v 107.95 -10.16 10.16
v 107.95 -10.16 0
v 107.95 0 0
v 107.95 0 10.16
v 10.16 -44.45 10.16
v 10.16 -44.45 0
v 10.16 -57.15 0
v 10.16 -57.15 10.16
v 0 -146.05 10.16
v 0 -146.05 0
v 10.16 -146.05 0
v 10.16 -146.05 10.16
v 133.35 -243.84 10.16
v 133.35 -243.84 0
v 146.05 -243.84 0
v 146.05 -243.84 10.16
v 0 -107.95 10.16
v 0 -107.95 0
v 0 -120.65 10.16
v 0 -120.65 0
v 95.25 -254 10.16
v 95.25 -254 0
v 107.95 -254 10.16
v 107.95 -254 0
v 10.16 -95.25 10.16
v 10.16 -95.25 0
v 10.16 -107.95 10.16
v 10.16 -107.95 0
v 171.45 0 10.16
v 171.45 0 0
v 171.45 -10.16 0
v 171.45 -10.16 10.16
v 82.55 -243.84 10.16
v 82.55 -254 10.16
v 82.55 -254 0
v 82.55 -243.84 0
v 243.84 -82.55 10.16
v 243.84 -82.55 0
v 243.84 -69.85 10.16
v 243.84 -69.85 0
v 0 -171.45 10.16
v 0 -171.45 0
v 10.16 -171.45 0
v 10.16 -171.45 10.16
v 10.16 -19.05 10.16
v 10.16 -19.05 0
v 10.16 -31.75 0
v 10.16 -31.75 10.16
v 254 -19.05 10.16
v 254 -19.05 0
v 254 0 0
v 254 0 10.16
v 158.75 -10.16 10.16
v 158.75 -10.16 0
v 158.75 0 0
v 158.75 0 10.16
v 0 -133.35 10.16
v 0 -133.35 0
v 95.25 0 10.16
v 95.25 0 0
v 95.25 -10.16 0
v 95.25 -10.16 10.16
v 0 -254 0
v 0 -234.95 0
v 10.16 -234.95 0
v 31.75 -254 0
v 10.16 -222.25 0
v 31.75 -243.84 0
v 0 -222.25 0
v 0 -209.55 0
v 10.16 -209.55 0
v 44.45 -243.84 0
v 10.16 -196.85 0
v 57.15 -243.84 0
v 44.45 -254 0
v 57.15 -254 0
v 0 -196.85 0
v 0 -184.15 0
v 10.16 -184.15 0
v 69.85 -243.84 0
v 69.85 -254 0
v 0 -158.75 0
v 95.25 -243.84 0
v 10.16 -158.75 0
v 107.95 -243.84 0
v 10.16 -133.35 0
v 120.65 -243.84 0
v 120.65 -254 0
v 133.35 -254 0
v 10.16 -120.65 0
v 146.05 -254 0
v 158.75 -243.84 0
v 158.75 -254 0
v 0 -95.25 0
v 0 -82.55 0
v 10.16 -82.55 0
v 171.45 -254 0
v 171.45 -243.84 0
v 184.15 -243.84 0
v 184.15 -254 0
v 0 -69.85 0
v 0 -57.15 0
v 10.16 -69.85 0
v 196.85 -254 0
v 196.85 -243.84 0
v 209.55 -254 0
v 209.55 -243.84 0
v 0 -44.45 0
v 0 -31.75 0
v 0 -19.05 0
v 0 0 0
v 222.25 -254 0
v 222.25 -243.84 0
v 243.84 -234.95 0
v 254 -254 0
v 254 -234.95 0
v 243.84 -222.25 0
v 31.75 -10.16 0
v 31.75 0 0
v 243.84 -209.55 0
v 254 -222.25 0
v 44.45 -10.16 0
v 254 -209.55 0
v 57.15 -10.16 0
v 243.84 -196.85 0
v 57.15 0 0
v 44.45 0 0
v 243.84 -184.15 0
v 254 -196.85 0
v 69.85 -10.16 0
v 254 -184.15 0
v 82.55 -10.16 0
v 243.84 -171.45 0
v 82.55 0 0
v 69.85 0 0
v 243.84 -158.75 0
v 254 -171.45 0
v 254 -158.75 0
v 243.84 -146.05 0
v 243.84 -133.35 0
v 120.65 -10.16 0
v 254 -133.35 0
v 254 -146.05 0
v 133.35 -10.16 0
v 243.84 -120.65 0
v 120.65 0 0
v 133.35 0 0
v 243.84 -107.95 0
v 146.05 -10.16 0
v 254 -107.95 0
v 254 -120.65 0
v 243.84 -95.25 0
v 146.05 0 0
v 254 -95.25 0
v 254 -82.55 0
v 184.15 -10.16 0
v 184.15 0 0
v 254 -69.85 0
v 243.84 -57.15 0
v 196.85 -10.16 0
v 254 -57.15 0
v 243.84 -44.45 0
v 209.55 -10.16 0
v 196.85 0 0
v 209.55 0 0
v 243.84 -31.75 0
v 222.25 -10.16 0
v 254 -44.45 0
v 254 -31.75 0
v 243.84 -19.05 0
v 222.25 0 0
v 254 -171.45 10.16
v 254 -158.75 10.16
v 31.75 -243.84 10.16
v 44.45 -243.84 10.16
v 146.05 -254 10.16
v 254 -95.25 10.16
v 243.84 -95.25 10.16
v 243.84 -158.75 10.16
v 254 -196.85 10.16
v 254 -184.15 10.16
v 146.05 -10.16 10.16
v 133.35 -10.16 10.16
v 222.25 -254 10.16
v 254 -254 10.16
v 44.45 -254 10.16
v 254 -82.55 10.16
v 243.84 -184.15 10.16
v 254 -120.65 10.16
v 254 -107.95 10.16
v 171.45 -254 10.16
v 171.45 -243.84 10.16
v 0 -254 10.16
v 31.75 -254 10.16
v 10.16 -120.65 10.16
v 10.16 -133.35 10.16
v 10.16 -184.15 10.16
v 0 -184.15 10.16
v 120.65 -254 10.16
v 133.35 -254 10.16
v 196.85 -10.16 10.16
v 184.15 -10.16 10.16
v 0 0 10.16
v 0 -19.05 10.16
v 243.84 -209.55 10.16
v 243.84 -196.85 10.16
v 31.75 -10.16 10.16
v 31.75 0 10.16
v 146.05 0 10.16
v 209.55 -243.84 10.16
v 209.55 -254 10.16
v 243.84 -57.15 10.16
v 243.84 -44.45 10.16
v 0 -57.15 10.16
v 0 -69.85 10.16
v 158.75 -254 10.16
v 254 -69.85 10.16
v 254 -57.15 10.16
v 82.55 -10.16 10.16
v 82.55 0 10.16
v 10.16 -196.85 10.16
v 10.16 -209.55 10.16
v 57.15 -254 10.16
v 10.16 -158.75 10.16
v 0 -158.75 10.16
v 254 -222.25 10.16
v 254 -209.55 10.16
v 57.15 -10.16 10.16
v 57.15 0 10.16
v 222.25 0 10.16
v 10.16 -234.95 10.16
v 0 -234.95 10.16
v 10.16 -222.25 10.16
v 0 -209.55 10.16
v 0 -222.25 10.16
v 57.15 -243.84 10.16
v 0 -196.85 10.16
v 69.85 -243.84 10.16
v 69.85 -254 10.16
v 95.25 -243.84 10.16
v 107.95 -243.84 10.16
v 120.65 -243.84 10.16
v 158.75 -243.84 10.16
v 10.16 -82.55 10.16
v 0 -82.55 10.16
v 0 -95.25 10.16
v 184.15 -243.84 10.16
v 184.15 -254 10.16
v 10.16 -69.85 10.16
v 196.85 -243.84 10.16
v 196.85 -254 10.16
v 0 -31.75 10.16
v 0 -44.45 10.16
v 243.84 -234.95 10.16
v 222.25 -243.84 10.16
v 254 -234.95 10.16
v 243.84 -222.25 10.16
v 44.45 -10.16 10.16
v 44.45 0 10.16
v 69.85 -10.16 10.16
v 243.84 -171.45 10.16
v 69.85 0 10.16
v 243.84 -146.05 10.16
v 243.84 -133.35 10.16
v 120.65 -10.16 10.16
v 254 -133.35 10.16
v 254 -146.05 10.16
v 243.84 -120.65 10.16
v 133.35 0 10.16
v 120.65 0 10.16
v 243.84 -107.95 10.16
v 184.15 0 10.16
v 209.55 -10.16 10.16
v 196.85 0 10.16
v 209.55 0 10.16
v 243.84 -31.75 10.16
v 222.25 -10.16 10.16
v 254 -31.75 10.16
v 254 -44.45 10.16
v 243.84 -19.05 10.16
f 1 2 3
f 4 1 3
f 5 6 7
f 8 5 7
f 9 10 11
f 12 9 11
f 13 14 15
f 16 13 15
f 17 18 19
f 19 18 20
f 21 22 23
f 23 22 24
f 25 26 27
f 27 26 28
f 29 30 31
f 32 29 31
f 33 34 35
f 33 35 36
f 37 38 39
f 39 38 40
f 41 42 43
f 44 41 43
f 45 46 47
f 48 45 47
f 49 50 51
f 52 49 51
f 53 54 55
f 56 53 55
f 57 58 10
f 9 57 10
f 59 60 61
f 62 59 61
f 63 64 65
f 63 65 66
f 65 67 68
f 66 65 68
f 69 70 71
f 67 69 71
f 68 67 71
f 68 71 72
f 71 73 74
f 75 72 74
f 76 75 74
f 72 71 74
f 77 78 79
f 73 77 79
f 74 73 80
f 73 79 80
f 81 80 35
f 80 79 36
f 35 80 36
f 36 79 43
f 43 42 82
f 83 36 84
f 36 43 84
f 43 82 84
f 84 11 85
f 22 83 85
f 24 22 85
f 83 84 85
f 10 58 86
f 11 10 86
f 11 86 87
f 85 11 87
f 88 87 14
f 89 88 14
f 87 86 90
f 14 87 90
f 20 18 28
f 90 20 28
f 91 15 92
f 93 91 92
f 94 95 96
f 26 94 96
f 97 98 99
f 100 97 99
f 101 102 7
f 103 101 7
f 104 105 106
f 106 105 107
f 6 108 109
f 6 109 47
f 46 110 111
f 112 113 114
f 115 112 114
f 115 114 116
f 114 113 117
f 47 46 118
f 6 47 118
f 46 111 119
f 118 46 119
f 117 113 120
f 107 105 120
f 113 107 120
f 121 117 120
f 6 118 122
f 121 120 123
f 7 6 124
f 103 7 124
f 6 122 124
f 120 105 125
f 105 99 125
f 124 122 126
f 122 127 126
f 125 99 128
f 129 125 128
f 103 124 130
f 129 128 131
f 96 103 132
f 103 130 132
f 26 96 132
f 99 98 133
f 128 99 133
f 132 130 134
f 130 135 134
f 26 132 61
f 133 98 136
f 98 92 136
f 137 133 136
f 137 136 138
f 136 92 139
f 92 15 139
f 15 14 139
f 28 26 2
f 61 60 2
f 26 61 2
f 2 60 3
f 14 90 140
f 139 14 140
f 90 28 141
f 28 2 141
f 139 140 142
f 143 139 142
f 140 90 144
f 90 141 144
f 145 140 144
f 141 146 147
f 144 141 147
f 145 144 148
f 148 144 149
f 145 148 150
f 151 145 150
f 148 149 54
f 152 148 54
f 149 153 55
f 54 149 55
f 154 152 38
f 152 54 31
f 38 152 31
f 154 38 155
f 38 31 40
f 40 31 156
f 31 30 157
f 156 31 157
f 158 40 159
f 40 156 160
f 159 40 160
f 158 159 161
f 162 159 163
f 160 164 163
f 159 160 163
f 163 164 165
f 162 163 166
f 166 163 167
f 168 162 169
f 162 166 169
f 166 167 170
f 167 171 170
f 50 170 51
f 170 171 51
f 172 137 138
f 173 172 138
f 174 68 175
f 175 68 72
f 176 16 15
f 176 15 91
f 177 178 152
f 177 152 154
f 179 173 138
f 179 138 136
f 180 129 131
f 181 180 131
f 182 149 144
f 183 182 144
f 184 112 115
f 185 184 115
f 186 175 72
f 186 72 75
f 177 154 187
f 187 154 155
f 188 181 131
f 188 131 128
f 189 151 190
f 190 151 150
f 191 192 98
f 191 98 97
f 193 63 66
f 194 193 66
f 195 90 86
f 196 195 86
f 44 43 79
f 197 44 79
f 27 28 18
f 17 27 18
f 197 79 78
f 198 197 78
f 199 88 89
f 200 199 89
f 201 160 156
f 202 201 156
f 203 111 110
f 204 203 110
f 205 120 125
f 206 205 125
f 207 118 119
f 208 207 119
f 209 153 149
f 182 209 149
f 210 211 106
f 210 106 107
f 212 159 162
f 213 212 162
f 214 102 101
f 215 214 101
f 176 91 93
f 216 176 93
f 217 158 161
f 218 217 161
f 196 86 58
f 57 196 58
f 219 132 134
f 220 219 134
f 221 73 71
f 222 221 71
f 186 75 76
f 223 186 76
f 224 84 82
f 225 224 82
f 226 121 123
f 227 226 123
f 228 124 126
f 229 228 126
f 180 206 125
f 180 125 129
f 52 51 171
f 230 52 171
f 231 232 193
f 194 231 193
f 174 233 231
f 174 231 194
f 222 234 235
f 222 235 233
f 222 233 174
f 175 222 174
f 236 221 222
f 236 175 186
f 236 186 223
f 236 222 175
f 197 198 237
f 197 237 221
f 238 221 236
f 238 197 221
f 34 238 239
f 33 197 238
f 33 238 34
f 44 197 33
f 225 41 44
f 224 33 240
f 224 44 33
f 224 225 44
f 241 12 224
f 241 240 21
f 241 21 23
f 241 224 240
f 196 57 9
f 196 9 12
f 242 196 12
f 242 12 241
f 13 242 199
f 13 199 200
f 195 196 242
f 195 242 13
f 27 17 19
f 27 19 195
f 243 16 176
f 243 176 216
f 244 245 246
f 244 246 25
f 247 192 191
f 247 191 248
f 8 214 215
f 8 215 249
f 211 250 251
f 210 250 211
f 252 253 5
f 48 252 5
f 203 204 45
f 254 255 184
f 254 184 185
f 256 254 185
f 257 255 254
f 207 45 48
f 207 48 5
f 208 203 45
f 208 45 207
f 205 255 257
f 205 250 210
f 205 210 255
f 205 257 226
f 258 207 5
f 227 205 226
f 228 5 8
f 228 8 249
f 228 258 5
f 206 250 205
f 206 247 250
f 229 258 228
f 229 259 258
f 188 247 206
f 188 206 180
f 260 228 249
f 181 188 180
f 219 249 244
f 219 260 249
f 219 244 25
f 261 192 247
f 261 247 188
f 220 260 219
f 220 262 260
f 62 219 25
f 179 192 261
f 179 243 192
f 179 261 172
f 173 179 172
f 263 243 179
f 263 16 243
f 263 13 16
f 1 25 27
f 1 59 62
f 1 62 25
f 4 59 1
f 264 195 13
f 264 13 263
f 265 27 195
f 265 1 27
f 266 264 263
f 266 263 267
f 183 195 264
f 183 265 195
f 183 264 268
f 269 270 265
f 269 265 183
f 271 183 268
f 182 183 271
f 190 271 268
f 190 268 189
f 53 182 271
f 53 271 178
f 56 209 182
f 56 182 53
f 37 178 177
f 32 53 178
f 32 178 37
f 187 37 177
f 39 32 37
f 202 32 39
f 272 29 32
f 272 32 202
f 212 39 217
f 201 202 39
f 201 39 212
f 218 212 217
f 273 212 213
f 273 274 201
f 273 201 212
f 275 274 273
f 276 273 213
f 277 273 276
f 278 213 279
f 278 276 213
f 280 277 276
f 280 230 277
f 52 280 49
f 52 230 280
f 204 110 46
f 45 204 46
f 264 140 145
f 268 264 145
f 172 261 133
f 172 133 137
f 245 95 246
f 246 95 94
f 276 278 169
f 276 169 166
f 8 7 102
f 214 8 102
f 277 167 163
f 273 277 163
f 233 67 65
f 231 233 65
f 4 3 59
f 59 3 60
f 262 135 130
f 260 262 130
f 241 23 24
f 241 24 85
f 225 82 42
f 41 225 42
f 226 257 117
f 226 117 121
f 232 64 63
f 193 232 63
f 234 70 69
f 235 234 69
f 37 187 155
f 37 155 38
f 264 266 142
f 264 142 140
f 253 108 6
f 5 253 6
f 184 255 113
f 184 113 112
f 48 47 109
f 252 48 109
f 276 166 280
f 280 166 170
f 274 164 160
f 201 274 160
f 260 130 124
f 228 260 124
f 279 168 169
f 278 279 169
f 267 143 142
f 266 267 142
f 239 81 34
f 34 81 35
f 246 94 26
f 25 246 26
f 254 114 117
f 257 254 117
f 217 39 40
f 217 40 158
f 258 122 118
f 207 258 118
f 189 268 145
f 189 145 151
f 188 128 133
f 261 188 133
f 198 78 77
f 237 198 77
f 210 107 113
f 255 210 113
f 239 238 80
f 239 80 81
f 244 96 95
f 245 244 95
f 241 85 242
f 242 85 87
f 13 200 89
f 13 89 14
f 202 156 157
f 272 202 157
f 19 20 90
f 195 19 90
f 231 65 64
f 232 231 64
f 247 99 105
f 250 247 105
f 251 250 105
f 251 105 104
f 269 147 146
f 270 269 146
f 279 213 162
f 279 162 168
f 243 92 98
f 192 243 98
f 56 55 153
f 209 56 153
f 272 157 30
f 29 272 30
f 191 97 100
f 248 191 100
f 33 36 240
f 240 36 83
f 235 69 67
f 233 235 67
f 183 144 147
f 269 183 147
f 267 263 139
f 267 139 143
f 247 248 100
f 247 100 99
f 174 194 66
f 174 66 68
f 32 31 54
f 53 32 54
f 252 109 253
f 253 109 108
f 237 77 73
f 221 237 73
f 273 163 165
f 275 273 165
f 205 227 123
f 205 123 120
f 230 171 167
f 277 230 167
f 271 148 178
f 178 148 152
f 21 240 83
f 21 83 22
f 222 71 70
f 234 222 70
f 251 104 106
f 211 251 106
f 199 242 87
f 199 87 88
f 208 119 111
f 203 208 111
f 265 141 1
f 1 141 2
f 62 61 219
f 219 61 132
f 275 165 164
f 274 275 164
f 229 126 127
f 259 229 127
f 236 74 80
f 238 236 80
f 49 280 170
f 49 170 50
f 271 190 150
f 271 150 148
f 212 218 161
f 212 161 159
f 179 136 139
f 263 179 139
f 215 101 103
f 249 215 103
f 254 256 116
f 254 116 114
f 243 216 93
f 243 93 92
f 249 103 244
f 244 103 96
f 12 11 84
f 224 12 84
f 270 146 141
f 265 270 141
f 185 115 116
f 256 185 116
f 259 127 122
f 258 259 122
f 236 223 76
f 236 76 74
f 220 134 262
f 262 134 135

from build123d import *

# Parameters (mm, degrees)
F1_DEPTH = 10.16


with BuildPart() as f1:
    # F0 (on Top) → F1 (new body)
    with BuildSketch(Plane.XY):
        Polygon((31.75, 0), (0, 0), (0, -19.05), (10.16, -19.05), (10.16, -31.75), (0, -31.75), (0, -44.45), (10.16, -44.45), (10.16, -57.15), (0, -57.15), (0, -69.85), (10.16, -69.85), (10.16, -82.55), (0, -82.55), (0, -95.25), (10.16, -95.25), (10.16, -107.95), (0, -107.95), (0, -120.65), (10.16, -120.65), (10.16, -133.35), (0, -133.35), (0, -146.05), (10.16, -146.05), (10.16, -158.75), (0, -158.75), (0, -171.45), (10.16, -171.45), (10.16, -184.15), (0, -184.15), (0, -196.85), (10.16, -196.85), (10.16, -209.55), (0, -209.55), (0, -222.25), (10.16, -222.25), (10.16, -234.95), (0, -234.95), (0, -254), (31.75, -254), (31.75, -243.84), (44.45, -243.84), (44.45, -254), (57.15, -254), (57.15, -243.84), (69.85, -243.84), (69.85, -254), (82.55, -254), (82.55, -243.84), (95.25, -243.84), (95.25, -254), (107.95, -254), (107.95, -243.84), (120.65, -243.84), (120.65, -254), (133.35, -254), (133.35, -243.84), (146.05, -243.84), (146.05, -254), (158.75, -254), (158.75, -243.84), (171.45, -243.84), (171.45, -254), (184.15, -254), (184.15, -243.84), (196.85, -243.84), (196.85, -254), (209.55, -254), (209.55, -243.84), (222.25, -243.84), (222.25, -254), (254, -254), (254, -234.95), (243.84, -234.95), (243.84, -222.25), (254, -222.25), (254, -209.55), (243.84, -209.55), (243.84, -196.85), (254, -196.85), (254, -184.15), (243.84, -184.15), (243.84, -171.45), (254, -171.45), (254, -158.75), (243.84, -158.75), (243.84, -146.05), (254, -146.05), (254, -133.35), (243.84, -133.35), (243.84, -120.65), (254, -120.65), (254, -107.95), (243.84, -107.95), (243.84, -95.25), (254, -95.25), (254, -82.55), (243.84, -82.55), (243.84, -69.85), (254, -69.85), (254, -57.15), (243.84, -57.15), (243.84, -44.45), (254, -44.45), (254, -31.75), (243.84, -31.75), (243.84, -19.05), (254, -19.05), (254, 0), (222.25, 0), (222.25, -10.16), (209.55, -10.16), (209.55, 0), (196.85, 0), (196.85, -10.16), (184.15, -10.16), (184.15, 0), (171.45, 0), (171.45, -10.16), (158.75, -10.16), (158.75, 0), (146.05, 0), (146.05, -10.16), (133.35, -10.16), (133.35, 0), (120.65, 0), (120.65, -10.16), (107.95, -10.16), (107.95, 0), (95.25, 0), (95.25, -10.16), (82.55, -10.16), (82.55, 0), (69.85, 0), (69.85, -10.16), (57.15, -10.16), (57.15, 0), (44.45, 0), (44.45, -10.16), (31.75, -10.16), align=None)
    extrude(amount=F1_DEPTH)


solid = f1.part
